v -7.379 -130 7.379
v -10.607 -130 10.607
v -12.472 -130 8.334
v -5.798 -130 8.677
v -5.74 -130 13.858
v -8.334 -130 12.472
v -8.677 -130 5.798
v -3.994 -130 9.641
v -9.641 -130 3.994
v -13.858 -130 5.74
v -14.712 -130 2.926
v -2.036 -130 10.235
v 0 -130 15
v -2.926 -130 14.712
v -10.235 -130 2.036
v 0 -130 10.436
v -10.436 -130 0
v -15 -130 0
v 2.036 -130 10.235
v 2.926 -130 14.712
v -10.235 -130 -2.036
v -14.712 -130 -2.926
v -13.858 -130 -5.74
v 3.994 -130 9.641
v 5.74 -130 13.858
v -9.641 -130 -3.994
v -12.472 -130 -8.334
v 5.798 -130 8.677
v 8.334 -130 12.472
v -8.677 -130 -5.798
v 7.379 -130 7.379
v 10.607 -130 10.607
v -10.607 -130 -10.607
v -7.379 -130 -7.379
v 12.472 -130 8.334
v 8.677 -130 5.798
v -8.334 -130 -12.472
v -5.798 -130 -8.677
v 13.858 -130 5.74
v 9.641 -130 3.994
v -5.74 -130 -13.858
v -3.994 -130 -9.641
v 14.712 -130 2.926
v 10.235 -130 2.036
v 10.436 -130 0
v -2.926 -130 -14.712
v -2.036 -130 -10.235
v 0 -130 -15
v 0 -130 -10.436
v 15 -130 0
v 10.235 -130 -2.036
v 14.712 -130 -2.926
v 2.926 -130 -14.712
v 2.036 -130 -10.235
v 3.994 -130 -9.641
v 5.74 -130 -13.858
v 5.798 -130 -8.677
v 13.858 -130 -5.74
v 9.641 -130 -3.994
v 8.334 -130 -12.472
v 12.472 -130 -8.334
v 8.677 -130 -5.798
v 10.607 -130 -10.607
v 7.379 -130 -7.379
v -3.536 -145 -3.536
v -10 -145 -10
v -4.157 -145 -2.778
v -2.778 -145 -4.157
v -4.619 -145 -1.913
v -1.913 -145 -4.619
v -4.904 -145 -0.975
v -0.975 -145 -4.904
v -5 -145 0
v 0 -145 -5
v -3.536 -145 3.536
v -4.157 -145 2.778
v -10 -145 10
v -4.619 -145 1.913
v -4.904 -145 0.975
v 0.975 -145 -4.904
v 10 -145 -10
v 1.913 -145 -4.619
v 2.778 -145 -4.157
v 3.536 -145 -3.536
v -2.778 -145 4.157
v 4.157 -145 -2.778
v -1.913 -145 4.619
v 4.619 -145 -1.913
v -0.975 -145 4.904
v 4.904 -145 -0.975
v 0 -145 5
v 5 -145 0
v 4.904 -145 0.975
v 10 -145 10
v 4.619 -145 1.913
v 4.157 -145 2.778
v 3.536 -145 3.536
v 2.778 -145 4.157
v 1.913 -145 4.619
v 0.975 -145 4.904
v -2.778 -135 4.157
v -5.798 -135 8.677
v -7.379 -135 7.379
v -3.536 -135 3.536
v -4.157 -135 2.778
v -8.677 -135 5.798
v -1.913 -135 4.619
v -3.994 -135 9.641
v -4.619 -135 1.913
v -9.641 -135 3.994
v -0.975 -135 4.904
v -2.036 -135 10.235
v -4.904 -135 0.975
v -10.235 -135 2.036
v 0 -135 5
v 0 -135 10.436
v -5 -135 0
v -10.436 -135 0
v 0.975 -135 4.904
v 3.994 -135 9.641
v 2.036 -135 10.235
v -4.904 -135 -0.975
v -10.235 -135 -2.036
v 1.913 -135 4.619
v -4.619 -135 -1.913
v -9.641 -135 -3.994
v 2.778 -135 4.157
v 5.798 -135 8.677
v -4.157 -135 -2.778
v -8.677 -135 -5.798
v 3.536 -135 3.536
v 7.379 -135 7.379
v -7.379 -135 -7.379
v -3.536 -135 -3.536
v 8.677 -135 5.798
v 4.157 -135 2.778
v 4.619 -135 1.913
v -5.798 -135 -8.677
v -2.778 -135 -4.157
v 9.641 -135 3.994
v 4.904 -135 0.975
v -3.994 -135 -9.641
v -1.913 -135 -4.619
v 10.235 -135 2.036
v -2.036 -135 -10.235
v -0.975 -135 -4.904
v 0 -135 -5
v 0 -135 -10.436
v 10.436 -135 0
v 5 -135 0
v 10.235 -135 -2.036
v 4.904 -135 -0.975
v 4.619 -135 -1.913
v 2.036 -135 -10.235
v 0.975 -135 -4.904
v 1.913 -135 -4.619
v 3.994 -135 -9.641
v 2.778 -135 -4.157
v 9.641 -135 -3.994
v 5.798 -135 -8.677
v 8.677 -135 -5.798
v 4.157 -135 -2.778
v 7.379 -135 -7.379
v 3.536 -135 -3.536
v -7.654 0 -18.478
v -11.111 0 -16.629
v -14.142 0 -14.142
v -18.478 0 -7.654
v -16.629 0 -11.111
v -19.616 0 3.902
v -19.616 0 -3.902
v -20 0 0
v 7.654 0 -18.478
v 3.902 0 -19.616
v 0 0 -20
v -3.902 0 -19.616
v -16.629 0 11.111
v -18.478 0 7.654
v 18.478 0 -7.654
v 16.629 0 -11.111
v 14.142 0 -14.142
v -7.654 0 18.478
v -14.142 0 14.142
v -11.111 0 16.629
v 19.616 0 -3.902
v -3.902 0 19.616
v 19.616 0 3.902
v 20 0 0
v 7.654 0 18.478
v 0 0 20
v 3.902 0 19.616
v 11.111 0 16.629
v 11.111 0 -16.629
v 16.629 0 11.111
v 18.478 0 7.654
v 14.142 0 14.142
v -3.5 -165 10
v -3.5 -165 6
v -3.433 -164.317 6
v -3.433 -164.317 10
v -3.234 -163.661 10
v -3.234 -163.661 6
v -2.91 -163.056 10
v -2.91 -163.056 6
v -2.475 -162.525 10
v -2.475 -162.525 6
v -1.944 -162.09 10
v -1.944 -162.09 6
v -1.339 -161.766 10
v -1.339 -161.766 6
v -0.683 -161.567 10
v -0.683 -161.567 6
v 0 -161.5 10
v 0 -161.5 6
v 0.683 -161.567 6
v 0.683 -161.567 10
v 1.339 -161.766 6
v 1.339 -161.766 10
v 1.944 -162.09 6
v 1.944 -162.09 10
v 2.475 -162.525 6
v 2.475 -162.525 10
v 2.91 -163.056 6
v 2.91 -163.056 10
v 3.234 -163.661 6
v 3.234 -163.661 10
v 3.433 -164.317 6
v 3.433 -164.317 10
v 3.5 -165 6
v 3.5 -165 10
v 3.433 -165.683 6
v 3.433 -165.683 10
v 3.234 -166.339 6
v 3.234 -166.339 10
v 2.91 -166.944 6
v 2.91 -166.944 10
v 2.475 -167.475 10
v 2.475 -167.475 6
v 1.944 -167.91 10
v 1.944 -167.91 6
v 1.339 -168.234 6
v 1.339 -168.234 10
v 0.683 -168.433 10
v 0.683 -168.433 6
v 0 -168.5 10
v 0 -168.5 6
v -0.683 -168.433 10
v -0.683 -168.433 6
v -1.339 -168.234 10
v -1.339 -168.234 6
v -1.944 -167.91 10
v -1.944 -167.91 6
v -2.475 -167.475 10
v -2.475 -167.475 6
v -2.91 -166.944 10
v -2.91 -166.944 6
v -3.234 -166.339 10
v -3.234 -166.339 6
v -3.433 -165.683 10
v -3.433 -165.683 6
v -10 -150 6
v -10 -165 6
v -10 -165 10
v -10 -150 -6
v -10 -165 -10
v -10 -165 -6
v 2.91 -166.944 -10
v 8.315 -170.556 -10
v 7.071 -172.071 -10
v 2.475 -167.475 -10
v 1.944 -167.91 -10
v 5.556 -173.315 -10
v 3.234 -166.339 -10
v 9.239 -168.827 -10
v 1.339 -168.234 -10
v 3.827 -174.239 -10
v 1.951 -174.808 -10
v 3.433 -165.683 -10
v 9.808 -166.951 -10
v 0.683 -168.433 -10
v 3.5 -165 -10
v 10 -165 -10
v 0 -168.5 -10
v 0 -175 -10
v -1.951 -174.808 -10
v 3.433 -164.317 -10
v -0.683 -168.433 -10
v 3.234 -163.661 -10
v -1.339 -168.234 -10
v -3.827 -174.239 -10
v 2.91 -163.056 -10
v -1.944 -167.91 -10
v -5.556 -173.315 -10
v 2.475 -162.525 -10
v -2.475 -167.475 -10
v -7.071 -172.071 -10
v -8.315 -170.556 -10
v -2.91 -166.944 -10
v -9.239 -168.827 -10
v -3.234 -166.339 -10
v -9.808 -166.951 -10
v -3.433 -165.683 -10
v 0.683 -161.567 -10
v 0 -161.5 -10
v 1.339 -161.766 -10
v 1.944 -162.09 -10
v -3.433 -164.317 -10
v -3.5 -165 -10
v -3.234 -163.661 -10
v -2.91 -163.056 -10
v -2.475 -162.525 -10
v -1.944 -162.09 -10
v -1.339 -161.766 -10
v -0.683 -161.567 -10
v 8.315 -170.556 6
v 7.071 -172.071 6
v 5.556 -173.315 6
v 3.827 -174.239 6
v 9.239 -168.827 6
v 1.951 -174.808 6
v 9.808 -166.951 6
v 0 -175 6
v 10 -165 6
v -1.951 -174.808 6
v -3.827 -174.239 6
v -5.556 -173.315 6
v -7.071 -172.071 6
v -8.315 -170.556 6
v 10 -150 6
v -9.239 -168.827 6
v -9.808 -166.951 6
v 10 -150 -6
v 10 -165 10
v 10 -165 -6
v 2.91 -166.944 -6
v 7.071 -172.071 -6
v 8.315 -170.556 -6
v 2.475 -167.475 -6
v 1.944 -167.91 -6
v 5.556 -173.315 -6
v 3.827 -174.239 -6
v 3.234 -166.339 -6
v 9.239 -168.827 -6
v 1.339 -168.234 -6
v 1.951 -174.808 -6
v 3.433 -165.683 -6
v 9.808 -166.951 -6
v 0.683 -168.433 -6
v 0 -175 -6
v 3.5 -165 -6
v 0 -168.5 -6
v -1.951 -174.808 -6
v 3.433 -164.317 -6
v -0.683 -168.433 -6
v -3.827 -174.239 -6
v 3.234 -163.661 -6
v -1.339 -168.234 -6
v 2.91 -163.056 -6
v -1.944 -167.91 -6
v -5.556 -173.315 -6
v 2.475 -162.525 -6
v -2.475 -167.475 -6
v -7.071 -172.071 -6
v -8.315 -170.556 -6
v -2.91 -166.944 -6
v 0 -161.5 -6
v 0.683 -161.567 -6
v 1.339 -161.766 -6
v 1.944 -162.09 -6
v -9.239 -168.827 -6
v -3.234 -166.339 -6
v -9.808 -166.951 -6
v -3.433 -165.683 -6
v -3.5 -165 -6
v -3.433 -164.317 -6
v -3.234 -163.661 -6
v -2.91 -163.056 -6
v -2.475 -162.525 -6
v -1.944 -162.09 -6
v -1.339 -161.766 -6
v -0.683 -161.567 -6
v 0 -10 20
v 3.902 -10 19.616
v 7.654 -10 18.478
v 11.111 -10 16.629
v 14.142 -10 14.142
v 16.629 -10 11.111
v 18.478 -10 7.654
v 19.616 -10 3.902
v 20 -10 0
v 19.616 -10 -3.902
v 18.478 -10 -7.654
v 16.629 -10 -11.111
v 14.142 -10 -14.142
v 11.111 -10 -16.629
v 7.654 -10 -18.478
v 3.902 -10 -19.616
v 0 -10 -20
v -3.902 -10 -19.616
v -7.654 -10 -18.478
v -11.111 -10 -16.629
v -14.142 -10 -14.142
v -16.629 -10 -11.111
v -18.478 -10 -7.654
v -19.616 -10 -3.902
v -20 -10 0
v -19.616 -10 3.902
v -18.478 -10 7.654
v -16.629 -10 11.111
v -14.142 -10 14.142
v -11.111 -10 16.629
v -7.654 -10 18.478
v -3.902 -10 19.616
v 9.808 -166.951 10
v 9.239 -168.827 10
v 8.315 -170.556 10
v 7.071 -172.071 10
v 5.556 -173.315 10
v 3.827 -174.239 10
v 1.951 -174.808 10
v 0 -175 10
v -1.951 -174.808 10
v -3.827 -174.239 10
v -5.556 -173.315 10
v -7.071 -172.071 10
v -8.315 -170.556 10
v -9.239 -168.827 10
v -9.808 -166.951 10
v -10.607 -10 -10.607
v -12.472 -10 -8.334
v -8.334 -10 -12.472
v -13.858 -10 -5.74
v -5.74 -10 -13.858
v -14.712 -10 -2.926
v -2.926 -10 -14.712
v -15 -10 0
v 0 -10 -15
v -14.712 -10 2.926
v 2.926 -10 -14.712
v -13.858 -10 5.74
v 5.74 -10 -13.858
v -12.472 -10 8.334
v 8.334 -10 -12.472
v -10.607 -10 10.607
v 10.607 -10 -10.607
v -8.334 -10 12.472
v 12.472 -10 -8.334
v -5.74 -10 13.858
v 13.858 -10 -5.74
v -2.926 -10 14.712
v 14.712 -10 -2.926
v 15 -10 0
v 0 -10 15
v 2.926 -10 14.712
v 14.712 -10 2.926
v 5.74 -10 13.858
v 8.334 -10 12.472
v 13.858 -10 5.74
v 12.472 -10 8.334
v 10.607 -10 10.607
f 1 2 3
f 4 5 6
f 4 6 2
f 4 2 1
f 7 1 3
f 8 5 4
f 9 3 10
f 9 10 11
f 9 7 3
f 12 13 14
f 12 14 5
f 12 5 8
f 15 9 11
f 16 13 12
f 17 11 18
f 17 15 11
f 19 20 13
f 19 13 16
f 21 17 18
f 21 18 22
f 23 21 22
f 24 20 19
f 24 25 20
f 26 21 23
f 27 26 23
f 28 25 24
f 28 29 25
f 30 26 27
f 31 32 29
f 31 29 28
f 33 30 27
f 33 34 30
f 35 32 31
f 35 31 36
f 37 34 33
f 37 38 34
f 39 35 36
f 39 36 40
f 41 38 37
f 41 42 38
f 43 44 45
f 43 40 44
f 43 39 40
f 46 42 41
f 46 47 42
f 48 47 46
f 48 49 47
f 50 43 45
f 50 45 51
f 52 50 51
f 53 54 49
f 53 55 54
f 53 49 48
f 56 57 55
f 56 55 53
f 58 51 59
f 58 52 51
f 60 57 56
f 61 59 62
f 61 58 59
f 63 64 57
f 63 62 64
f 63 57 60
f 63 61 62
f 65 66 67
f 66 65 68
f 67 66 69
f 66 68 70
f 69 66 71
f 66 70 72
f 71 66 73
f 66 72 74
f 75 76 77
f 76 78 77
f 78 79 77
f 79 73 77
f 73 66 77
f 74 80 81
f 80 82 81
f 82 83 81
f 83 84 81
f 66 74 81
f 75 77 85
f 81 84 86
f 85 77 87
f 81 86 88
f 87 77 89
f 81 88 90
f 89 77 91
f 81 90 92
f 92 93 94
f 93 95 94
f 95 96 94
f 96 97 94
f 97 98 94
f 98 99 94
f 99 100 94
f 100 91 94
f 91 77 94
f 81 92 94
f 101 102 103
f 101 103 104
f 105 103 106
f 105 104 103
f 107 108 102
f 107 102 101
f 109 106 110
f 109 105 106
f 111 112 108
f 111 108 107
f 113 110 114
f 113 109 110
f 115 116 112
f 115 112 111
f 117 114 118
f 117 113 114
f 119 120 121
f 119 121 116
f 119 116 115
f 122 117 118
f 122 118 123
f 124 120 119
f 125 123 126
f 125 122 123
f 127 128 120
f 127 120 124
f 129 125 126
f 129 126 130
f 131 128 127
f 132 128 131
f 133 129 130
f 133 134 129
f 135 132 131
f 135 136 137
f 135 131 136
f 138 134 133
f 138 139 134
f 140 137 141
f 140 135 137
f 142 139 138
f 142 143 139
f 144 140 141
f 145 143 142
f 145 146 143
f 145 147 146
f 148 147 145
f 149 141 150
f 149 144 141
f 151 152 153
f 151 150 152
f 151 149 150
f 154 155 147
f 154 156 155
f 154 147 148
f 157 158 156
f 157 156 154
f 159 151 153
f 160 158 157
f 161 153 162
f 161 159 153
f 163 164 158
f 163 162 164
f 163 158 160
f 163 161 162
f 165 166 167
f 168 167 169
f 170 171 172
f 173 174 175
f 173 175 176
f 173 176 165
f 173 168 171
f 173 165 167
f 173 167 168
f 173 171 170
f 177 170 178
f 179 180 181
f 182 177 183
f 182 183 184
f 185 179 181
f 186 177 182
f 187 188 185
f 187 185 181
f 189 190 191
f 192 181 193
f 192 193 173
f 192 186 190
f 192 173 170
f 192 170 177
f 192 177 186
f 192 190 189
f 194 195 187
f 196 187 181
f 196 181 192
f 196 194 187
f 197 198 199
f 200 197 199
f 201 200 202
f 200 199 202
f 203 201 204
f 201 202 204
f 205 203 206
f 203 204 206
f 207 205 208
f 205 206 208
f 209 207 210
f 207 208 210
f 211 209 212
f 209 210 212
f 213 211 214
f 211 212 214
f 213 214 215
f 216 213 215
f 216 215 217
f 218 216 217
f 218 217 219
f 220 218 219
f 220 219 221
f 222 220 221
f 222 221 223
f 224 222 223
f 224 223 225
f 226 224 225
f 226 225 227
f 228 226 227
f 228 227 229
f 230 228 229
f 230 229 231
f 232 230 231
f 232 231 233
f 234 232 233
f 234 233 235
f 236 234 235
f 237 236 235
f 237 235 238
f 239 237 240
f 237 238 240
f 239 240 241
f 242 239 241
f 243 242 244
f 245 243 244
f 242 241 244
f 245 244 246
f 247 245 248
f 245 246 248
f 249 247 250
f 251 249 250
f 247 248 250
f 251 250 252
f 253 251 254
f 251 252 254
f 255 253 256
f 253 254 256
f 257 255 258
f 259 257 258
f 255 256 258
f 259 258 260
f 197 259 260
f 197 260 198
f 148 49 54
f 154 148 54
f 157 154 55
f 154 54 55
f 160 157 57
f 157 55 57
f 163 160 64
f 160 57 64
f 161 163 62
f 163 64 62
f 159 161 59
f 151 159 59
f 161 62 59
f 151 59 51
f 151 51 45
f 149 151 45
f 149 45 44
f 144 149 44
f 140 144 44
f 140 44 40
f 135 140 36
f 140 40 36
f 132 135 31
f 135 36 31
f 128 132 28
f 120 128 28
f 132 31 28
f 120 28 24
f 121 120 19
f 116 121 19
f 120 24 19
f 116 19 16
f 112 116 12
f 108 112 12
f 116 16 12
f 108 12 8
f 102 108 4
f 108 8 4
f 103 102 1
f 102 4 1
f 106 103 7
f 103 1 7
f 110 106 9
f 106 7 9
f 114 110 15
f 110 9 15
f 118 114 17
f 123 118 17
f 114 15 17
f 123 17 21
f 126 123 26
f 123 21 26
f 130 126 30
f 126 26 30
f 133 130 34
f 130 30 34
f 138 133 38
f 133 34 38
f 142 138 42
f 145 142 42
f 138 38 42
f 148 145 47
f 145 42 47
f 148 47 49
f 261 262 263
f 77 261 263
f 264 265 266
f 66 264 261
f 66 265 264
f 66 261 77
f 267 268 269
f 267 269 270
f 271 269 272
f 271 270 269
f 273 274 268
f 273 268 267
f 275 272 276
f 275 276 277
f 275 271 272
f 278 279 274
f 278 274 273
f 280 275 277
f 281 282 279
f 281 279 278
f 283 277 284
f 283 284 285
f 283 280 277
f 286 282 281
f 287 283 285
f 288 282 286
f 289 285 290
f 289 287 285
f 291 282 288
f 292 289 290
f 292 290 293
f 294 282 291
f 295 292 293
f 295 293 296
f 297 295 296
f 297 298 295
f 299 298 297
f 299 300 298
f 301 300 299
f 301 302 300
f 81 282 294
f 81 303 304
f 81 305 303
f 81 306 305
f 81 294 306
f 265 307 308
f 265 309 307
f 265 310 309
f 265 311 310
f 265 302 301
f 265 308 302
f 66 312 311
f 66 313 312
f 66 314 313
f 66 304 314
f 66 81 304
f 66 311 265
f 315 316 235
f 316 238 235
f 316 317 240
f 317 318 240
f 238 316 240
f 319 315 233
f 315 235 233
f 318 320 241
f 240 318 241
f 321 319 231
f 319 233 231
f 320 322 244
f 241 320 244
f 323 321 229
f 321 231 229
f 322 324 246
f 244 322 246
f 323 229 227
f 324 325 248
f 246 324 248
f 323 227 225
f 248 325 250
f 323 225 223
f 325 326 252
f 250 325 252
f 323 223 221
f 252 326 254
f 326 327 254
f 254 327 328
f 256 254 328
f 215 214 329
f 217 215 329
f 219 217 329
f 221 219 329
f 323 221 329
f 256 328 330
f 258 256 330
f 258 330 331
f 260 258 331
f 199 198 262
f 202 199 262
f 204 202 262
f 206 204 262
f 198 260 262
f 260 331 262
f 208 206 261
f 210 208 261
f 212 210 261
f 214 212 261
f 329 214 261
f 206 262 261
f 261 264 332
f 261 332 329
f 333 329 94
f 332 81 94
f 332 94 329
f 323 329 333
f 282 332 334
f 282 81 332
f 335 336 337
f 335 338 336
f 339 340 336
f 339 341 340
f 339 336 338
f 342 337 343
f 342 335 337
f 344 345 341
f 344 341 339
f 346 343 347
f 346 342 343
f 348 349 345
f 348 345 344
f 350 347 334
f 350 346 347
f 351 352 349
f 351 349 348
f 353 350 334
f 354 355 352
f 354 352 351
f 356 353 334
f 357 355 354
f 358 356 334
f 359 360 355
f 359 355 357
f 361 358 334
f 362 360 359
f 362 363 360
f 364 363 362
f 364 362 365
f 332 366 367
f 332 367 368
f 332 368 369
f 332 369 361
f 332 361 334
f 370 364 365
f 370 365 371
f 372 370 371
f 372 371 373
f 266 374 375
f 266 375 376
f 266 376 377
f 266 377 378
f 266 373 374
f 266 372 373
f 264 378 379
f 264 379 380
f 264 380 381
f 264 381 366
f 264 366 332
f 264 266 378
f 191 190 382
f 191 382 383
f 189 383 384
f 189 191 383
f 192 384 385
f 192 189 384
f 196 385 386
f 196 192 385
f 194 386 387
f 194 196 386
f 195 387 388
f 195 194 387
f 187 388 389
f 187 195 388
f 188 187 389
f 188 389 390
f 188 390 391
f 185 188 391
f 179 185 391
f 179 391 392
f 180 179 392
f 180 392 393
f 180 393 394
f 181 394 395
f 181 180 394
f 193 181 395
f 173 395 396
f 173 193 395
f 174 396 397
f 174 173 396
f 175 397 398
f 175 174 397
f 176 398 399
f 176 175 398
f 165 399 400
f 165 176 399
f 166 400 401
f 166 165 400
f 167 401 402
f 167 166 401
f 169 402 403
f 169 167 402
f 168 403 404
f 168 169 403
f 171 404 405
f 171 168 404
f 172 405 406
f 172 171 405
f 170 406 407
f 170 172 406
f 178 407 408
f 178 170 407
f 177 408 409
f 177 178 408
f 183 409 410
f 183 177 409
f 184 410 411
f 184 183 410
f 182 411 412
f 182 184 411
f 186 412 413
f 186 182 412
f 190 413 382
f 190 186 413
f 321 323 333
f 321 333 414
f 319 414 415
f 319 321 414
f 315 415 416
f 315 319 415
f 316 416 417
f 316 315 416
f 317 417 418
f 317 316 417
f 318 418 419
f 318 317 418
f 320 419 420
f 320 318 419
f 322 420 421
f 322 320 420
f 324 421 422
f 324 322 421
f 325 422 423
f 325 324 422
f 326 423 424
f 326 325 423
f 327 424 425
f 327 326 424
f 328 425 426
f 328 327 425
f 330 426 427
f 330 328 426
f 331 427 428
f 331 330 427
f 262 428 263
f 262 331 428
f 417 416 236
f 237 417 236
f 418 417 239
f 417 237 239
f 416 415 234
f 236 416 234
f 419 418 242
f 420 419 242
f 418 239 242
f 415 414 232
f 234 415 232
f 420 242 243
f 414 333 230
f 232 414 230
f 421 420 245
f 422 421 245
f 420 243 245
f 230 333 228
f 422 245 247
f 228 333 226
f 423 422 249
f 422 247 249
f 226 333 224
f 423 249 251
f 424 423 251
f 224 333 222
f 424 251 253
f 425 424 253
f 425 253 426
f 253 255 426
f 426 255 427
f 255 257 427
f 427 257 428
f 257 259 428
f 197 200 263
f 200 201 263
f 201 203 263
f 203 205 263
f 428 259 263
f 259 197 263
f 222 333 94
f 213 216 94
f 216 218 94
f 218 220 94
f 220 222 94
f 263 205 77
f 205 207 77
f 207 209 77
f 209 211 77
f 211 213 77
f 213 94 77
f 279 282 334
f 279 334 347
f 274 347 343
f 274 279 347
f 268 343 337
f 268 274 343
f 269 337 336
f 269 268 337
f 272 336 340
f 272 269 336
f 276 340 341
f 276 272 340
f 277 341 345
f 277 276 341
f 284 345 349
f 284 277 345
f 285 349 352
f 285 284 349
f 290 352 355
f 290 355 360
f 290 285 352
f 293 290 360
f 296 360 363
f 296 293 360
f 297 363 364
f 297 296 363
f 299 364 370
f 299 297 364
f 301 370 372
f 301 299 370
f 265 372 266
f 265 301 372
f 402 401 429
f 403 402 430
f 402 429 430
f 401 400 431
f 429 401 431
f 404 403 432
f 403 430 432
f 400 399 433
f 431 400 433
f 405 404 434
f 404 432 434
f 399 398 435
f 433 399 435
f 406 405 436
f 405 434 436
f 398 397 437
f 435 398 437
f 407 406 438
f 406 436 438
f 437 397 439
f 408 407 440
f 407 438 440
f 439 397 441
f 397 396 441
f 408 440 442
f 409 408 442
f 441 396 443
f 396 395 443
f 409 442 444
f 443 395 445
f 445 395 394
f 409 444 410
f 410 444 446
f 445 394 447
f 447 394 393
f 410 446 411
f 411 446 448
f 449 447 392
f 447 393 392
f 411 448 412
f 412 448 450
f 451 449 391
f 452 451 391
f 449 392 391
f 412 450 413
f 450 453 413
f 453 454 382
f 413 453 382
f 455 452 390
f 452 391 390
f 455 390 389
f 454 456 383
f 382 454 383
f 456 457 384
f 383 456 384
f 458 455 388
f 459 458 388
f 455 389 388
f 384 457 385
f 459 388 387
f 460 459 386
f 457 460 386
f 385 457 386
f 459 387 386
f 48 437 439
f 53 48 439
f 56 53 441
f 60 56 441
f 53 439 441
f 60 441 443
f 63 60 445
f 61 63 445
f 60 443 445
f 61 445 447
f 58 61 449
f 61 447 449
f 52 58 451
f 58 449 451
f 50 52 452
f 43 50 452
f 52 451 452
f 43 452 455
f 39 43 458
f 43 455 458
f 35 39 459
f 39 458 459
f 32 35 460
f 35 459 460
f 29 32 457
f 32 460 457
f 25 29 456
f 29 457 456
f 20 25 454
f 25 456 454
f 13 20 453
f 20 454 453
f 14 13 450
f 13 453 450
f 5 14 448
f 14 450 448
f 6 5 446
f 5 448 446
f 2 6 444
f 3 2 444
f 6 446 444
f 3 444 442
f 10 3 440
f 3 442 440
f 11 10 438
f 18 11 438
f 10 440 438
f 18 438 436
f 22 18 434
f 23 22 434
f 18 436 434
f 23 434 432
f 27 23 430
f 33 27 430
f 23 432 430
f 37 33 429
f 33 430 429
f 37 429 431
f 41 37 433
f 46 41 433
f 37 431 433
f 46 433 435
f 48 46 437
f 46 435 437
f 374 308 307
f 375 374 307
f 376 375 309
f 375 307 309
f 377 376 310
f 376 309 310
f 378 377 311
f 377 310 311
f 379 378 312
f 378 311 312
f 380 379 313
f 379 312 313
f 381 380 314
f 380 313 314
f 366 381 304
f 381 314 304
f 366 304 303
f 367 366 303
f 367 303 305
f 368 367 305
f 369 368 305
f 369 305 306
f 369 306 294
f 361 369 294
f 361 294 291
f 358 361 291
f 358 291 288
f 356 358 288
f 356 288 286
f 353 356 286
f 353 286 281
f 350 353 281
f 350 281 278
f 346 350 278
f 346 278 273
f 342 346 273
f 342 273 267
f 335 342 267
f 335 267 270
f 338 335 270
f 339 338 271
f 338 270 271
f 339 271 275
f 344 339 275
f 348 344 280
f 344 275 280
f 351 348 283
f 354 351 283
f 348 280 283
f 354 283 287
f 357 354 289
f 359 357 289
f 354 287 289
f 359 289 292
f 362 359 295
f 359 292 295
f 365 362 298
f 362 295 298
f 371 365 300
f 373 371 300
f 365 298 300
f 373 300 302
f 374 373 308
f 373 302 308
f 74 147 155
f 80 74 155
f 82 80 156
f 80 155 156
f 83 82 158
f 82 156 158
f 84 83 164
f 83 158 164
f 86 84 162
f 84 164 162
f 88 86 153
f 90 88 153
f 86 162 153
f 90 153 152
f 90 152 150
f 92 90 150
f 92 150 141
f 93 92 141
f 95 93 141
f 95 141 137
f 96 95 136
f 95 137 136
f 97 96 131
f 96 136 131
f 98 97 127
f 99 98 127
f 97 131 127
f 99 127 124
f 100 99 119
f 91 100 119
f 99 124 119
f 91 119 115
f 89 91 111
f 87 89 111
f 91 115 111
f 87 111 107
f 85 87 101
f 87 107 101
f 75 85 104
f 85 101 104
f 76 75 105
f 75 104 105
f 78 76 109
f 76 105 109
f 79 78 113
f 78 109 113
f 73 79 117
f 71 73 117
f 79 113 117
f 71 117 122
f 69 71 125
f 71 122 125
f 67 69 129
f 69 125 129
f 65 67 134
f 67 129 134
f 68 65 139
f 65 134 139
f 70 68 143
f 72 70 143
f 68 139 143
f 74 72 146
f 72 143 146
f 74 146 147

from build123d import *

# Parameters (mm, degrees)
SKETCH3_R           = 20
BOSS_EXTRUDE1_DEPTH = 10
SKETCH4_R           = 15
BOSS_EXTRUDE2_DEPTH = 120
SKETCH5_R           = 10.435871031
BOSS_EXTRUDE3_DEPTH = 5
SKETCH6_R           = 5
BOSS_EXTRUDE4_DEPTH = 10
SKETCH7_W           = 20
SKETCH7_H           = 20
BOSS_EXTRUDE5_DEPTH = 5
SKETCH8_R           = 3.5
BOSS_EXTRUDE6_DEPTH = 20
SKETCH9_W           = 12
SKETCH9_H           = 25
CUT_EXTRUDE1_DEPTH  = 27


with BuildPart() as part:
    # Sketch3 → Boss-Extrude1 (new body)
    with BuildSketch(Plane(origin=(0, 0, 0), x_dir=(1, 0, 0), z_dir=(0, 1, 0))):
        with Locations(Location((0, 0, 0), (0, 0, 270))):
            Circle(SKETCH3_R)
    extrude(amount=-BOSS_EXTRUDE1_DEPTH)

    # Sketch4 → Boss-Extrude2 (add)
    with BuildSketch(Plane.XZ.offset(10)):
        with Locations(Location((0, 0, 0), (0, 0, 270))):
            Circle(SKETCH4_R)
    extrude(amount=BOSS_EXTRUDE2_DEPTH)

    # Sketch5 → Boss-Extrude3 (add)
    with BuildSketch(Plane.XZ.offset(130)):
        with Locations(Location((0, 0, 0), (0, 0, 270))):
            Circle(SKETCH5_R)
    extrude(amount=BOSS_EXTRUDE3_DEPTH)

    # Sketch6 → Boss-Extrude4 (add)
    with BuildSketch(Plane(origin=(0, -135, 0), x_dir=(-1, 0, 0), z_dir=(0, -1, 0))):
        with Locations(Location((0, 0, 0), (0, 0, 90))):
            Circle(SKETCH6_R)
    extrude(amount=BOSS_EXTRUDE4_DEPTH)

    # Sketch7 → Boss-Extrude5 (add)
    with BuildSketch(Plane.XZ.offset(145)):
        Rectangle(SKETCH7_W, SKETCH7_H)
    extrude(amount=BOSS_EXTRUDE5_DEPTH)

    # Sketch8 → Boss-Extrude6 (add)
    with BuildSketch(Plane(origin=(0, 0, -10), x_dir=(-1, 0, 0), z_dir=(0, 0, -1))):
        with BuildLine():
            Line((-10, -150), (-10, -165))
            ThreePointArc((-10, -165), (0, -175), (10, -165))
            Line((10, -165), (10, -150))
            Line((10, -150), (-10, -150))
        make_face()
        with Locations((0, -165)):
            Circle(SKETCH8_R, mode=Mode.SUBTRACT)
    extrude(amount=-BOSS_EXTRUDE6_DEPTH)

    # Sketch9 → Cut-Extrude1 (cut, symmetric)
    with BuildSketch(Plane.ZY.offset(10)):
        with Locations((0, -162.5)):
            Rectangle(SKETCH9_W, SKETCH9_H)
    extrude(amount=CUT_EXTRUDE1_DEPTH, both=True, mode=Mode.SUBTRACT)


solid = part.part
